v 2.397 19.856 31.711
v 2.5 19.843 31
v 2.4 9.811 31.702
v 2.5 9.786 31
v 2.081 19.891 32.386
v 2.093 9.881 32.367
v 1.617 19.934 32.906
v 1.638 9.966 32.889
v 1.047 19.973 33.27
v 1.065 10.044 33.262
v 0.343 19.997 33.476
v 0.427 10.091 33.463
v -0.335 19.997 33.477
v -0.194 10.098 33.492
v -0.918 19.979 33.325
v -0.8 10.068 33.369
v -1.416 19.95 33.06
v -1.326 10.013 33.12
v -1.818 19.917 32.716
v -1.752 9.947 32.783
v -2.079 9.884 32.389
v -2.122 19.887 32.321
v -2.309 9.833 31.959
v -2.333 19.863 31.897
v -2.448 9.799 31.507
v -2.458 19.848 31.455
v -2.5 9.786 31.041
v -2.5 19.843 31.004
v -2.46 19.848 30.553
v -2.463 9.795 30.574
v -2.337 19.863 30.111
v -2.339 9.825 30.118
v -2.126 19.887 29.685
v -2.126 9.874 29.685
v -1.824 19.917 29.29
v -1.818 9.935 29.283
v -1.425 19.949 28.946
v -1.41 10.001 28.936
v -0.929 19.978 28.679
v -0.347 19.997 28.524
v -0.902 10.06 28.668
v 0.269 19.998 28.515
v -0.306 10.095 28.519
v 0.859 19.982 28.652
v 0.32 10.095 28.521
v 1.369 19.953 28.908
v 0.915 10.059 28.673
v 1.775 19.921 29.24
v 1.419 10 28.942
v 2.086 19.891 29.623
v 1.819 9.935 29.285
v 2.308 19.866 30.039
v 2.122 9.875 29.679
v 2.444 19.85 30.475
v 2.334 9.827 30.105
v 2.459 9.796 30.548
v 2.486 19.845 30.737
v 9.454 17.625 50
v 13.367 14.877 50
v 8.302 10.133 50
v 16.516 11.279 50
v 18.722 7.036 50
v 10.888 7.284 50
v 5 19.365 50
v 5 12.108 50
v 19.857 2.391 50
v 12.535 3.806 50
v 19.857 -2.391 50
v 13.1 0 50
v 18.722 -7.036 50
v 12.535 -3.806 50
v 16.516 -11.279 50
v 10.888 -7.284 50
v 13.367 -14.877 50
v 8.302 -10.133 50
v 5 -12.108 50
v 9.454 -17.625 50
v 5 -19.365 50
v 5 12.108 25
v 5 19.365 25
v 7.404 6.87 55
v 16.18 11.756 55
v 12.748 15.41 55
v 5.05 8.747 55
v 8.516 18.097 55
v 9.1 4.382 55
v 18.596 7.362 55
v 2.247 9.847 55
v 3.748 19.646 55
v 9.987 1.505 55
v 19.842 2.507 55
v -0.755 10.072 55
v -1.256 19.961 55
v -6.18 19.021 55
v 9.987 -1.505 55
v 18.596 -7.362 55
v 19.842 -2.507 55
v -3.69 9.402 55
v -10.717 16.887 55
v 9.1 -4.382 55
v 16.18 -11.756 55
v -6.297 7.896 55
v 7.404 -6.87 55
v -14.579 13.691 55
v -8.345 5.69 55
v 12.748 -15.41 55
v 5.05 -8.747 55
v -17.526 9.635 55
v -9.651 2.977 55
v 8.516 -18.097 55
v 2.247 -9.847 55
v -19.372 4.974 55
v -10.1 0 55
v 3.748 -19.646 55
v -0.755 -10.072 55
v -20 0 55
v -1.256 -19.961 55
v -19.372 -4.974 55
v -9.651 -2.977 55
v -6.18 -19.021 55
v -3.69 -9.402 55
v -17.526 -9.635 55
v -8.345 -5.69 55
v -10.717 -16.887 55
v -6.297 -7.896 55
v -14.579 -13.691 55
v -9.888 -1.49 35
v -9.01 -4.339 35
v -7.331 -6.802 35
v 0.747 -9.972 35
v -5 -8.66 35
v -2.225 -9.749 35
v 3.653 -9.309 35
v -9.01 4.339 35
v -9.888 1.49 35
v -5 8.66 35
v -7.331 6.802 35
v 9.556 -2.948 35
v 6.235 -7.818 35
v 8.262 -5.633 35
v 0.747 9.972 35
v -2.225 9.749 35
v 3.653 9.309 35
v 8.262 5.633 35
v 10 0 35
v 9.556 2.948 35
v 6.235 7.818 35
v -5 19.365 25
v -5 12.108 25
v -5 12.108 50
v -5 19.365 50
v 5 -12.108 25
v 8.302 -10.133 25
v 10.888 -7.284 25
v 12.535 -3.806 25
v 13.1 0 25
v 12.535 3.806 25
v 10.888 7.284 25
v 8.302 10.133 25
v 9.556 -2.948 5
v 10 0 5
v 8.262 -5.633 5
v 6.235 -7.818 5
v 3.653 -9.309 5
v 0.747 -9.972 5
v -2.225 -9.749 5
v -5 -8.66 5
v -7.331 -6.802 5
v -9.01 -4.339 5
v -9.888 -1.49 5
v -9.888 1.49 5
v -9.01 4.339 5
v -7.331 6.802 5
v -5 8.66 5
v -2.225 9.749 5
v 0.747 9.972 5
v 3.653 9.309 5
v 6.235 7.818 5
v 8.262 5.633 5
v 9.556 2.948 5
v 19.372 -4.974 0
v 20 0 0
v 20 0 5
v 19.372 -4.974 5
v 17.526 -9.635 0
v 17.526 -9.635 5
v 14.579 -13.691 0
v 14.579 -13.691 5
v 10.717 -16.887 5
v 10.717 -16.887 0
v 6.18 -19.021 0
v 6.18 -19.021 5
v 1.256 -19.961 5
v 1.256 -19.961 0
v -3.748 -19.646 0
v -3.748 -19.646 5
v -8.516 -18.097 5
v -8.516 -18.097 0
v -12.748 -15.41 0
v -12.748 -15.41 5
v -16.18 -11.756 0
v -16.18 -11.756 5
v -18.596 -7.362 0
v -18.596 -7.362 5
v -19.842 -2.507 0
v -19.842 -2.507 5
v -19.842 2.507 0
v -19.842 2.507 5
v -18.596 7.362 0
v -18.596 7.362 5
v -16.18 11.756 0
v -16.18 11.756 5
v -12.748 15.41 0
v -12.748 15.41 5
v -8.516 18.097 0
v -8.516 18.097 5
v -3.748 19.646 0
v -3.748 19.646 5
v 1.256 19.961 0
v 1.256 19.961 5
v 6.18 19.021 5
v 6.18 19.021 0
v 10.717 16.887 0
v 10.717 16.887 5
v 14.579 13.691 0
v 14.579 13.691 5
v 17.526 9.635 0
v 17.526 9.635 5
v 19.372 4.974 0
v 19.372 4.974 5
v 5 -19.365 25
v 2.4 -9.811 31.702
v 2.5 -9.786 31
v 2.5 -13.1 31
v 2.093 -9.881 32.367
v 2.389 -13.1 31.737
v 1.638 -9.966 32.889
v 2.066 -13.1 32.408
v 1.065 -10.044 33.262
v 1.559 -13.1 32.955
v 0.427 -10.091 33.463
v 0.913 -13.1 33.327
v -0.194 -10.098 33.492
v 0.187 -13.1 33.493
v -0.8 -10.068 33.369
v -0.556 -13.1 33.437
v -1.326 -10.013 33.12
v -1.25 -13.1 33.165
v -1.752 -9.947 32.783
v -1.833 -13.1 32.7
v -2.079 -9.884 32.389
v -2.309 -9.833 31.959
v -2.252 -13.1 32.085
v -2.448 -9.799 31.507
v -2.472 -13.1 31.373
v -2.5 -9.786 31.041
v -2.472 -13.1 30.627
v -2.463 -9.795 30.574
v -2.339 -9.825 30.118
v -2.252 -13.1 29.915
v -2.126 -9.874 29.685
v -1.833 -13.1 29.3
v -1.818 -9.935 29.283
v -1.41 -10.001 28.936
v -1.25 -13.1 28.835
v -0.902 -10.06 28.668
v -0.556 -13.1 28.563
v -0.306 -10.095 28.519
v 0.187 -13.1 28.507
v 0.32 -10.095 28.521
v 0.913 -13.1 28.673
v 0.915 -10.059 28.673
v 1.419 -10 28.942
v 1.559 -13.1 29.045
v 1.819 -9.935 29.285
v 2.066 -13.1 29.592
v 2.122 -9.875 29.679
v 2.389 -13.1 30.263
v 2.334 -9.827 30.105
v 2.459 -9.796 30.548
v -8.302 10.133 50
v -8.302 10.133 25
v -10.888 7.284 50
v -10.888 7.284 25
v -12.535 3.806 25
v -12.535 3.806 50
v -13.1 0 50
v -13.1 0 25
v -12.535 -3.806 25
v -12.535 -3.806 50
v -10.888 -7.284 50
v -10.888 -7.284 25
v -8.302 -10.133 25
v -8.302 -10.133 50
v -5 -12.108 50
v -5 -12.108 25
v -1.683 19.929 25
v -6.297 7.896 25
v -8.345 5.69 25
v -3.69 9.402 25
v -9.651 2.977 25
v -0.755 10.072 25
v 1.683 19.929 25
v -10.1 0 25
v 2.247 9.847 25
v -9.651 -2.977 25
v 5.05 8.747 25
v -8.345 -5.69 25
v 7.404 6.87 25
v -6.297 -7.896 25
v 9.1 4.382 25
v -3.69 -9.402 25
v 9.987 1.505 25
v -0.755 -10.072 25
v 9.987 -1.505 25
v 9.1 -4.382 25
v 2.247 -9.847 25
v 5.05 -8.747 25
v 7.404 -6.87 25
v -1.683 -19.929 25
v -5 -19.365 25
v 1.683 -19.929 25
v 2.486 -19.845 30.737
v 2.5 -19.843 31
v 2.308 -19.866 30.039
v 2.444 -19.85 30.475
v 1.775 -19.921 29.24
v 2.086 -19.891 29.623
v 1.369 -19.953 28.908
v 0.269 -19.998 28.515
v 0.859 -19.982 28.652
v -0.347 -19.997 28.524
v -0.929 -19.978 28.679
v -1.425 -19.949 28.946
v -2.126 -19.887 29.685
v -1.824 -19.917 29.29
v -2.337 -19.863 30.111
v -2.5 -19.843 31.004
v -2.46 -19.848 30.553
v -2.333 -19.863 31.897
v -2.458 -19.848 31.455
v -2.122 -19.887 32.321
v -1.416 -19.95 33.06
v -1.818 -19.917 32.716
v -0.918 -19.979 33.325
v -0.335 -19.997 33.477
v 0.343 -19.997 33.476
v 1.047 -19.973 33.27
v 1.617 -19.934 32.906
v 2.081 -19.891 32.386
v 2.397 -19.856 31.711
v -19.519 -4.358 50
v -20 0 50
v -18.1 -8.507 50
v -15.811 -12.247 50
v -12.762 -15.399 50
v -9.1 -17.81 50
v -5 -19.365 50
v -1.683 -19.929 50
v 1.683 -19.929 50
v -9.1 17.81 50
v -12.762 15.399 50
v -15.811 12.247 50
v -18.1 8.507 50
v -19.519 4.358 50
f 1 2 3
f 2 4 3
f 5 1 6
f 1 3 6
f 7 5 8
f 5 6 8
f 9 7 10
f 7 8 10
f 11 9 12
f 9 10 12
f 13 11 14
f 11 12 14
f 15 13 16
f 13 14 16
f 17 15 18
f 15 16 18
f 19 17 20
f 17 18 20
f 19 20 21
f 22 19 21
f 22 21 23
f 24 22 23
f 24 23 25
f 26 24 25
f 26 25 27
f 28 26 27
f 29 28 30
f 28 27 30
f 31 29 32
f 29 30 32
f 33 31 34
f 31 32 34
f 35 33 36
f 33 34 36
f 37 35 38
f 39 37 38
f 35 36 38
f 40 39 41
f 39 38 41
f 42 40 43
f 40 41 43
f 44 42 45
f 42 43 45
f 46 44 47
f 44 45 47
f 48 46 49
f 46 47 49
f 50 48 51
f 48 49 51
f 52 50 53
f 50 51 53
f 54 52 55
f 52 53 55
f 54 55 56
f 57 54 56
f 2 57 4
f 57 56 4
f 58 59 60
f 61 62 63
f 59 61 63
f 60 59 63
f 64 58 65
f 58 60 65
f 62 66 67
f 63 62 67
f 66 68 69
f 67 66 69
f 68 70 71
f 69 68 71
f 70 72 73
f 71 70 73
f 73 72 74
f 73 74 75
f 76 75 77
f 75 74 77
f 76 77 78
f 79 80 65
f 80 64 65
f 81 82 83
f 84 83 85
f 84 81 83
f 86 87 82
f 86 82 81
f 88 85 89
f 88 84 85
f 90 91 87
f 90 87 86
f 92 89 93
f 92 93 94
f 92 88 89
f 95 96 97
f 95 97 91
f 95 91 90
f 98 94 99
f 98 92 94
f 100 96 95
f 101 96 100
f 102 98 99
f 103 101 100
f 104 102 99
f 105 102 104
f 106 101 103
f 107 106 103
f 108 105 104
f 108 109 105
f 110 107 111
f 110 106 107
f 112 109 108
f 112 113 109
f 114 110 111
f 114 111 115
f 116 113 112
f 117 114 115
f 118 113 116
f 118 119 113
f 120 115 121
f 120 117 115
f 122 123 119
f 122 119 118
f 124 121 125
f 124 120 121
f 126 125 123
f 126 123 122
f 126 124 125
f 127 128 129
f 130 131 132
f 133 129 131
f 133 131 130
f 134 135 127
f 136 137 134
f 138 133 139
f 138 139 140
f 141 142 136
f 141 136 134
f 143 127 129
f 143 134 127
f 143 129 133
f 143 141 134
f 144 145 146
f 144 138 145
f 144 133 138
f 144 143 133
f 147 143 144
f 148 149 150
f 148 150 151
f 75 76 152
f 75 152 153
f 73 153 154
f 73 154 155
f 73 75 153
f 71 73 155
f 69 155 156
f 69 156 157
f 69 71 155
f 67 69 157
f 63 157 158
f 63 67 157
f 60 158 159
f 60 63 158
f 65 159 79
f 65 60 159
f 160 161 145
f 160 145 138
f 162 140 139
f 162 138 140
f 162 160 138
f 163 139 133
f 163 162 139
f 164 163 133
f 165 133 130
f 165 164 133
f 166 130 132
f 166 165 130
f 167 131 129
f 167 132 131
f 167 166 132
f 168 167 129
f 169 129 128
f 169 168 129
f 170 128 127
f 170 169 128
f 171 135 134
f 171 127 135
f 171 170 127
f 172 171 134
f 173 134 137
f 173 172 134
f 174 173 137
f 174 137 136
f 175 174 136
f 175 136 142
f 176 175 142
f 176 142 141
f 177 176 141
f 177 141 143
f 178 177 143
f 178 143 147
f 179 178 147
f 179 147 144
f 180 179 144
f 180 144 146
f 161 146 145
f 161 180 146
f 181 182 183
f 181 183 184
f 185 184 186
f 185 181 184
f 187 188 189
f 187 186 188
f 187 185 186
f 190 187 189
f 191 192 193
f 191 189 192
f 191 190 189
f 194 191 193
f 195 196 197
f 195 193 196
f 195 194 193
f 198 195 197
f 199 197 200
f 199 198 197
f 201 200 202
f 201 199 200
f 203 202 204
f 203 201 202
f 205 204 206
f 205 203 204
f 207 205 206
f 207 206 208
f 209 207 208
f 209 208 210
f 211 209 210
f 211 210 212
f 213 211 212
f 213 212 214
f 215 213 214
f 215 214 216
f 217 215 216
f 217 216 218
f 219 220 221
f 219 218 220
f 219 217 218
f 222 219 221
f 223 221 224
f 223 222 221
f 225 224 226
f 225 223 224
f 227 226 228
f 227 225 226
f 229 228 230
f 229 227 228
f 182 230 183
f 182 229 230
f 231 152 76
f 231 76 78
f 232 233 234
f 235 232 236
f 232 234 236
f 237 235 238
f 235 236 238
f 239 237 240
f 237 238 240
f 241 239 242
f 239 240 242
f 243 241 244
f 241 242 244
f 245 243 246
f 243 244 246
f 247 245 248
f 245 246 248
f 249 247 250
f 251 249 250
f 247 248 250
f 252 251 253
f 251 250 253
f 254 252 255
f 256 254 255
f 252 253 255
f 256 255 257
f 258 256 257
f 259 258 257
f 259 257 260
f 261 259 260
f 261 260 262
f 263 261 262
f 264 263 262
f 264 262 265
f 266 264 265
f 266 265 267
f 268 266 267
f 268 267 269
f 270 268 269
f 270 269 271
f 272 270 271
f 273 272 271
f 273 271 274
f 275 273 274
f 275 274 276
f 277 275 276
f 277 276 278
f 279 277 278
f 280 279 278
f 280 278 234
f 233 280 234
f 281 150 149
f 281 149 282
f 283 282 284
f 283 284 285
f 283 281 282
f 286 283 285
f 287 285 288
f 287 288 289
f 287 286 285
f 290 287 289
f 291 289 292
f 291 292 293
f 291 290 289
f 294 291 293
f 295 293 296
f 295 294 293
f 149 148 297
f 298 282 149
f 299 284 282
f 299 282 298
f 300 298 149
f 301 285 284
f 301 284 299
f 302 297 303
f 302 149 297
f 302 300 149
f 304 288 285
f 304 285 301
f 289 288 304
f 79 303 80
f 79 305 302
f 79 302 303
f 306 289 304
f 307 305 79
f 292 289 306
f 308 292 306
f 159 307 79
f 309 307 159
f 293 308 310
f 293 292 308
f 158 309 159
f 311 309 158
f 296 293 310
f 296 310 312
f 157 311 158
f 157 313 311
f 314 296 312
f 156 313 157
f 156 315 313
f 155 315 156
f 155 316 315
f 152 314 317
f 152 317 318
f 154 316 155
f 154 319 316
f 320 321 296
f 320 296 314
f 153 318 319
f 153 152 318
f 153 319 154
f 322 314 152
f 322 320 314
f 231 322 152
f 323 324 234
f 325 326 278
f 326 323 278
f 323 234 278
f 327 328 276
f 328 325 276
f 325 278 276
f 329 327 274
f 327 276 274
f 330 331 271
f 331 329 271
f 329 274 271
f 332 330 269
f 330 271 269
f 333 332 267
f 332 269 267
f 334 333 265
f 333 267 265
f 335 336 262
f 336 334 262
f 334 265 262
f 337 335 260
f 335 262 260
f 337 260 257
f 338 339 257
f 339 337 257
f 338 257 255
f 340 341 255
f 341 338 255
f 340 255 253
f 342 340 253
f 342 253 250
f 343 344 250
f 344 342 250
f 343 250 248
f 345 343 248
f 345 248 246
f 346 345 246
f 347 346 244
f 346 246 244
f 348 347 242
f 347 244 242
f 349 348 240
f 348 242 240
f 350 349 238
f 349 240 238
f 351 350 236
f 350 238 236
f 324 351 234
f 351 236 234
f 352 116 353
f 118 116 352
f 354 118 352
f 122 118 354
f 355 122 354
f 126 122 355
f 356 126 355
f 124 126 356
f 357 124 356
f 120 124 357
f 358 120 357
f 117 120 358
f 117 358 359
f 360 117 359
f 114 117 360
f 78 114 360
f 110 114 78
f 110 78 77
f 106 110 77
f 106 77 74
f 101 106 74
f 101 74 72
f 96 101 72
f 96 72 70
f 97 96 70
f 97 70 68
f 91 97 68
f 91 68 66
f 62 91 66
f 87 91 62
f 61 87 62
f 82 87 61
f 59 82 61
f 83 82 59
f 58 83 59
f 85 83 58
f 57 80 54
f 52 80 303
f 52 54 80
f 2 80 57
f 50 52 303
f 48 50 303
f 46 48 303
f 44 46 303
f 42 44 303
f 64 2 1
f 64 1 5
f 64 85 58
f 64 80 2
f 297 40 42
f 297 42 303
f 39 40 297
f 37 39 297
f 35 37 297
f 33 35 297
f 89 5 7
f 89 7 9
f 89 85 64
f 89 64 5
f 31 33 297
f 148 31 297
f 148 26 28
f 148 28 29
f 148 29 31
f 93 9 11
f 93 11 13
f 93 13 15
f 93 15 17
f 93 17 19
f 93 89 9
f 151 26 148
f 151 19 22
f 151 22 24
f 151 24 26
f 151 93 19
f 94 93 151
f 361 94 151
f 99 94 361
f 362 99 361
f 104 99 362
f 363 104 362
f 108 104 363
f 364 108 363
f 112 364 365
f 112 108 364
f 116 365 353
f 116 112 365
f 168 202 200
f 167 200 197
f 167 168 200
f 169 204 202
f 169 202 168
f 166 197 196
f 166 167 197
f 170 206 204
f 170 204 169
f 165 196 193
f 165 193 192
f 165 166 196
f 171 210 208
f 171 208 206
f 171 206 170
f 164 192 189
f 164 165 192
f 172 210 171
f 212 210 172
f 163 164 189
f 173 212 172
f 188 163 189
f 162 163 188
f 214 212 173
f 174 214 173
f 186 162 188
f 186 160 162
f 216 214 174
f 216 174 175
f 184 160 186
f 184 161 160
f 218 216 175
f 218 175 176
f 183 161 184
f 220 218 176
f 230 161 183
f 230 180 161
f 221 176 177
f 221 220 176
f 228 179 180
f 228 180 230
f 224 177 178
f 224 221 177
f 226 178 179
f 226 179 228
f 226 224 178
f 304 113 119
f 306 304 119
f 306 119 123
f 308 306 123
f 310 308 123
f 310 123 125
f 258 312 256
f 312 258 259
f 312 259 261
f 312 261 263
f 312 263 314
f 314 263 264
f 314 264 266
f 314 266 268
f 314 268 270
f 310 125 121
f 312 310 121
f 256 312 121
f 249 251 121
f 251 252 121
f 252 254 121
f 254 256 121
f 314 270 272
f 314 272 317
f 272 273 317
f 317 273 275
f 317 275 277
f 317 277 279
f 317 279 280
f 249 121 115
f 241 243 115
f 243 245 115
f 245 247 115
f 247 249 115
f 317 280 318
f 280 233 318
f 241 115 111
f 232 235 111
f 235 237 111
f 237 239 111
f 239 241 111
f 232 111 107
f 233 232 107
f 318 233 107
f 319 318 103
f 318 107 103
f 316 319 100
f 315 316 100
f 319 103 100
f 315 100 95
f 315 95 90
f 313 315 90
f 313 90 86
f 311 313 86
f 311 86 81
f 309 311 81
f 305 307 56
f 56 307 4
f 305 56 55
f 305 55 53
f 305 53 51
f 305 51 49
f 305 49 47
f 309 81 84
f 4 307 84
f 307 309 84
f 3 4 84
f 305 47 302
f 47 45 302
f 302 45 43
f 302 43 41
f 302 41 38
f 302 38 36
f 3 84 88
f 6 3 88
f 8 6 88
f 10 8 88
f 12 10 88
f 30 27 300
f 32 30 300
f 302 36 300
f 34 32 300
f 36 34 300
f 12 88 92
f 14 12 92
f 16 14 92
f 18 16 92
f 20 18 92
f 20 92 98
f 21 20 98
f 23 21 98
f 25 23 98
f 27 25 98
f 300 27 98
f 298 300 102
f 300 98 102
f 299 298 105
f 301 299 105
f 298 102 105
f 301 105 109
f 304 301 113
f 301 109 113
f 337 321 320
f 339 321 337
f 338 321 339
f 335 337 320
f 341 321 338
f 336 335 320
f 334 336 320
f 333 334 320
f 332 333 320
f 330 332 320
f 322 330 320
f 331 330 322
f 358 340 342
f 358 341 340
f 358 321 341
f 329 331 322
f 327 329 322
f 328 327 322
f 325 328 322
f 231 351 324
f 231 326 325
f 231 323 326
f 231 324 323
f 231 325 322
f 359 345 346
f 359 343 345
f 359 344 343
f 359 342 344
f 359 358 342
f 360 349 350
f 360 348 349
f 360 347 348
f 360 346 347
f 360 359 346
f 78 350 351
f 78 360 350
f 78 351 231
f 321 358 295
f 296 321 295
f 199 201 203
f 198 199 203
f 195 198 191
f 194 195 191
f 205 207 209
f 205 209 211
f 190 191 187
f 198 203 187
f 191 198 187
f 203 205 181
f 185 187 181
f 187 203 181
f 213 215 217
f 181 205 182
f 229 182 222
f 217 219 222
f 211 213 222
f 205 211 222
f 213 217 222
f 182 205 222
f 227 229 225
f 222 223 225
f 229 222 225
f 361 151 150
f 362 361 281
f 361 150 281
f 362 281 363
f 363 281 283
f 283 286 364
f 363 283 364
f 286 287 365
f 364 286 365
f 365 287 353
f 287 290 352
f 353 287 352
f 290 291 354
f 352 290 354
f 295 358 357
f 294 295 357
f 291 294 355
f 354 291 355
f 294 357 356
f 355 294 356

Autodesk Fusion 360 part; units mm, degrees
sketch "Esquisse1" plane through (0, 0, 0) normal (0, 0, 1) x (1, 0, 0) in component "feet"
  circle A0 centre (0, 0) radius 20
  circle A1 centre (0, 0) radius 10
  dimension "d1" = 40
  dimension "d2" = 20
extrude "Extrusion1" add sketch "Esquisse1" along normal blind 5 makes body 1 in component "feet"
extrude "Extrusion2" add sketch "Esquisse1" along normal blind 35 contours A1 bodies 1 in component "feet"
sketch "Esquisse1 (2)" plane through (0, 0, 35) normal (0, 0, 1) x (-1, 0, 0) in component "Component"
  circle A0 centre (0, 0) radius 10
  circle A1 centre (0, 0) radius 10.1
  circle A2 centre (0, 0) radius 13.1
  circle A3 centre (0, 0) radius 20
  dimension "d7" = 0.1
  dimension "d8" = 3.1
extrude "Extrusion1'" add sketch "Esquisse1 (2)" against normal blind 5 separate body contours A3 makes body 2 in component "Component"
extrude "Extrusion2'" add sketch "Esquisse1 (2)" against normal blind 30 contours A2 bodies 2 in component "Component"
ref_plane "Plan de construction1" through (0, -13.1, 13.2652) normal (0, -1, 0) x (1, 0, 0) in component "Component"
sketch "Esquisse2" plane through (0, -13.1, 13.2652) normal (0, -1, 0) x (1, 0, 0) in component "Component"
  circle A0 centre (0, -2.2652) radius 2.5
  line L0 (-13.1, -8.2652) -> (13.1, -8.2652)
  line L1 (0, 22) -> (0, -8.2652) construction
  dimension "d20" = 5
  dimension "d21" = 6
sketch "Esquisse3" plane through (0, 0, 30) normal (0, 0, -1) x (1, 0, 0) in component "Component"
  circle A0 centre (0, 0) radius 13.1
  circle A1 centre (0, 0) radius 20
  line L0 (5, 27.5) -> (-5, 27.5)
  line L1 (-5, 27.5) -> (-5, -27.5)
  line L2 (-5, -27.5) -> (5, -27.5)
  line L3 (5, -27.5) -> (5, 27.5)
  line L4 (5, 27.5) -> (-5, -27.5) construction
  line L5 (-5, 27.5) -> (5, -27.5) construction
  dimension "d24" = 10
extrude "Extrusion4" add sketch "Esquisse3" along normal up to surface (25 mm away) contours A0 A1 L1 L3 | A0 A1 L1 L3 bodies 2 in component "Component"
extrude "Extrusion3" [suppressed] in component "feet"
extrude "Extrusion3'" cut sketch "Esquisse2" along normal through all and the other way through all bodies 2 in component "Component"
component "feet" placed x (1, 0, 0) y (0, 1, 0) z (0, 0, 1) at (0, 0, 0)
component "Component" placed x (1, 0, 0) y (0, 1, 0) z (0, 0, 1) at (0, 0, 20)
equation "d8 = 3 mm + 0.1 mm"
